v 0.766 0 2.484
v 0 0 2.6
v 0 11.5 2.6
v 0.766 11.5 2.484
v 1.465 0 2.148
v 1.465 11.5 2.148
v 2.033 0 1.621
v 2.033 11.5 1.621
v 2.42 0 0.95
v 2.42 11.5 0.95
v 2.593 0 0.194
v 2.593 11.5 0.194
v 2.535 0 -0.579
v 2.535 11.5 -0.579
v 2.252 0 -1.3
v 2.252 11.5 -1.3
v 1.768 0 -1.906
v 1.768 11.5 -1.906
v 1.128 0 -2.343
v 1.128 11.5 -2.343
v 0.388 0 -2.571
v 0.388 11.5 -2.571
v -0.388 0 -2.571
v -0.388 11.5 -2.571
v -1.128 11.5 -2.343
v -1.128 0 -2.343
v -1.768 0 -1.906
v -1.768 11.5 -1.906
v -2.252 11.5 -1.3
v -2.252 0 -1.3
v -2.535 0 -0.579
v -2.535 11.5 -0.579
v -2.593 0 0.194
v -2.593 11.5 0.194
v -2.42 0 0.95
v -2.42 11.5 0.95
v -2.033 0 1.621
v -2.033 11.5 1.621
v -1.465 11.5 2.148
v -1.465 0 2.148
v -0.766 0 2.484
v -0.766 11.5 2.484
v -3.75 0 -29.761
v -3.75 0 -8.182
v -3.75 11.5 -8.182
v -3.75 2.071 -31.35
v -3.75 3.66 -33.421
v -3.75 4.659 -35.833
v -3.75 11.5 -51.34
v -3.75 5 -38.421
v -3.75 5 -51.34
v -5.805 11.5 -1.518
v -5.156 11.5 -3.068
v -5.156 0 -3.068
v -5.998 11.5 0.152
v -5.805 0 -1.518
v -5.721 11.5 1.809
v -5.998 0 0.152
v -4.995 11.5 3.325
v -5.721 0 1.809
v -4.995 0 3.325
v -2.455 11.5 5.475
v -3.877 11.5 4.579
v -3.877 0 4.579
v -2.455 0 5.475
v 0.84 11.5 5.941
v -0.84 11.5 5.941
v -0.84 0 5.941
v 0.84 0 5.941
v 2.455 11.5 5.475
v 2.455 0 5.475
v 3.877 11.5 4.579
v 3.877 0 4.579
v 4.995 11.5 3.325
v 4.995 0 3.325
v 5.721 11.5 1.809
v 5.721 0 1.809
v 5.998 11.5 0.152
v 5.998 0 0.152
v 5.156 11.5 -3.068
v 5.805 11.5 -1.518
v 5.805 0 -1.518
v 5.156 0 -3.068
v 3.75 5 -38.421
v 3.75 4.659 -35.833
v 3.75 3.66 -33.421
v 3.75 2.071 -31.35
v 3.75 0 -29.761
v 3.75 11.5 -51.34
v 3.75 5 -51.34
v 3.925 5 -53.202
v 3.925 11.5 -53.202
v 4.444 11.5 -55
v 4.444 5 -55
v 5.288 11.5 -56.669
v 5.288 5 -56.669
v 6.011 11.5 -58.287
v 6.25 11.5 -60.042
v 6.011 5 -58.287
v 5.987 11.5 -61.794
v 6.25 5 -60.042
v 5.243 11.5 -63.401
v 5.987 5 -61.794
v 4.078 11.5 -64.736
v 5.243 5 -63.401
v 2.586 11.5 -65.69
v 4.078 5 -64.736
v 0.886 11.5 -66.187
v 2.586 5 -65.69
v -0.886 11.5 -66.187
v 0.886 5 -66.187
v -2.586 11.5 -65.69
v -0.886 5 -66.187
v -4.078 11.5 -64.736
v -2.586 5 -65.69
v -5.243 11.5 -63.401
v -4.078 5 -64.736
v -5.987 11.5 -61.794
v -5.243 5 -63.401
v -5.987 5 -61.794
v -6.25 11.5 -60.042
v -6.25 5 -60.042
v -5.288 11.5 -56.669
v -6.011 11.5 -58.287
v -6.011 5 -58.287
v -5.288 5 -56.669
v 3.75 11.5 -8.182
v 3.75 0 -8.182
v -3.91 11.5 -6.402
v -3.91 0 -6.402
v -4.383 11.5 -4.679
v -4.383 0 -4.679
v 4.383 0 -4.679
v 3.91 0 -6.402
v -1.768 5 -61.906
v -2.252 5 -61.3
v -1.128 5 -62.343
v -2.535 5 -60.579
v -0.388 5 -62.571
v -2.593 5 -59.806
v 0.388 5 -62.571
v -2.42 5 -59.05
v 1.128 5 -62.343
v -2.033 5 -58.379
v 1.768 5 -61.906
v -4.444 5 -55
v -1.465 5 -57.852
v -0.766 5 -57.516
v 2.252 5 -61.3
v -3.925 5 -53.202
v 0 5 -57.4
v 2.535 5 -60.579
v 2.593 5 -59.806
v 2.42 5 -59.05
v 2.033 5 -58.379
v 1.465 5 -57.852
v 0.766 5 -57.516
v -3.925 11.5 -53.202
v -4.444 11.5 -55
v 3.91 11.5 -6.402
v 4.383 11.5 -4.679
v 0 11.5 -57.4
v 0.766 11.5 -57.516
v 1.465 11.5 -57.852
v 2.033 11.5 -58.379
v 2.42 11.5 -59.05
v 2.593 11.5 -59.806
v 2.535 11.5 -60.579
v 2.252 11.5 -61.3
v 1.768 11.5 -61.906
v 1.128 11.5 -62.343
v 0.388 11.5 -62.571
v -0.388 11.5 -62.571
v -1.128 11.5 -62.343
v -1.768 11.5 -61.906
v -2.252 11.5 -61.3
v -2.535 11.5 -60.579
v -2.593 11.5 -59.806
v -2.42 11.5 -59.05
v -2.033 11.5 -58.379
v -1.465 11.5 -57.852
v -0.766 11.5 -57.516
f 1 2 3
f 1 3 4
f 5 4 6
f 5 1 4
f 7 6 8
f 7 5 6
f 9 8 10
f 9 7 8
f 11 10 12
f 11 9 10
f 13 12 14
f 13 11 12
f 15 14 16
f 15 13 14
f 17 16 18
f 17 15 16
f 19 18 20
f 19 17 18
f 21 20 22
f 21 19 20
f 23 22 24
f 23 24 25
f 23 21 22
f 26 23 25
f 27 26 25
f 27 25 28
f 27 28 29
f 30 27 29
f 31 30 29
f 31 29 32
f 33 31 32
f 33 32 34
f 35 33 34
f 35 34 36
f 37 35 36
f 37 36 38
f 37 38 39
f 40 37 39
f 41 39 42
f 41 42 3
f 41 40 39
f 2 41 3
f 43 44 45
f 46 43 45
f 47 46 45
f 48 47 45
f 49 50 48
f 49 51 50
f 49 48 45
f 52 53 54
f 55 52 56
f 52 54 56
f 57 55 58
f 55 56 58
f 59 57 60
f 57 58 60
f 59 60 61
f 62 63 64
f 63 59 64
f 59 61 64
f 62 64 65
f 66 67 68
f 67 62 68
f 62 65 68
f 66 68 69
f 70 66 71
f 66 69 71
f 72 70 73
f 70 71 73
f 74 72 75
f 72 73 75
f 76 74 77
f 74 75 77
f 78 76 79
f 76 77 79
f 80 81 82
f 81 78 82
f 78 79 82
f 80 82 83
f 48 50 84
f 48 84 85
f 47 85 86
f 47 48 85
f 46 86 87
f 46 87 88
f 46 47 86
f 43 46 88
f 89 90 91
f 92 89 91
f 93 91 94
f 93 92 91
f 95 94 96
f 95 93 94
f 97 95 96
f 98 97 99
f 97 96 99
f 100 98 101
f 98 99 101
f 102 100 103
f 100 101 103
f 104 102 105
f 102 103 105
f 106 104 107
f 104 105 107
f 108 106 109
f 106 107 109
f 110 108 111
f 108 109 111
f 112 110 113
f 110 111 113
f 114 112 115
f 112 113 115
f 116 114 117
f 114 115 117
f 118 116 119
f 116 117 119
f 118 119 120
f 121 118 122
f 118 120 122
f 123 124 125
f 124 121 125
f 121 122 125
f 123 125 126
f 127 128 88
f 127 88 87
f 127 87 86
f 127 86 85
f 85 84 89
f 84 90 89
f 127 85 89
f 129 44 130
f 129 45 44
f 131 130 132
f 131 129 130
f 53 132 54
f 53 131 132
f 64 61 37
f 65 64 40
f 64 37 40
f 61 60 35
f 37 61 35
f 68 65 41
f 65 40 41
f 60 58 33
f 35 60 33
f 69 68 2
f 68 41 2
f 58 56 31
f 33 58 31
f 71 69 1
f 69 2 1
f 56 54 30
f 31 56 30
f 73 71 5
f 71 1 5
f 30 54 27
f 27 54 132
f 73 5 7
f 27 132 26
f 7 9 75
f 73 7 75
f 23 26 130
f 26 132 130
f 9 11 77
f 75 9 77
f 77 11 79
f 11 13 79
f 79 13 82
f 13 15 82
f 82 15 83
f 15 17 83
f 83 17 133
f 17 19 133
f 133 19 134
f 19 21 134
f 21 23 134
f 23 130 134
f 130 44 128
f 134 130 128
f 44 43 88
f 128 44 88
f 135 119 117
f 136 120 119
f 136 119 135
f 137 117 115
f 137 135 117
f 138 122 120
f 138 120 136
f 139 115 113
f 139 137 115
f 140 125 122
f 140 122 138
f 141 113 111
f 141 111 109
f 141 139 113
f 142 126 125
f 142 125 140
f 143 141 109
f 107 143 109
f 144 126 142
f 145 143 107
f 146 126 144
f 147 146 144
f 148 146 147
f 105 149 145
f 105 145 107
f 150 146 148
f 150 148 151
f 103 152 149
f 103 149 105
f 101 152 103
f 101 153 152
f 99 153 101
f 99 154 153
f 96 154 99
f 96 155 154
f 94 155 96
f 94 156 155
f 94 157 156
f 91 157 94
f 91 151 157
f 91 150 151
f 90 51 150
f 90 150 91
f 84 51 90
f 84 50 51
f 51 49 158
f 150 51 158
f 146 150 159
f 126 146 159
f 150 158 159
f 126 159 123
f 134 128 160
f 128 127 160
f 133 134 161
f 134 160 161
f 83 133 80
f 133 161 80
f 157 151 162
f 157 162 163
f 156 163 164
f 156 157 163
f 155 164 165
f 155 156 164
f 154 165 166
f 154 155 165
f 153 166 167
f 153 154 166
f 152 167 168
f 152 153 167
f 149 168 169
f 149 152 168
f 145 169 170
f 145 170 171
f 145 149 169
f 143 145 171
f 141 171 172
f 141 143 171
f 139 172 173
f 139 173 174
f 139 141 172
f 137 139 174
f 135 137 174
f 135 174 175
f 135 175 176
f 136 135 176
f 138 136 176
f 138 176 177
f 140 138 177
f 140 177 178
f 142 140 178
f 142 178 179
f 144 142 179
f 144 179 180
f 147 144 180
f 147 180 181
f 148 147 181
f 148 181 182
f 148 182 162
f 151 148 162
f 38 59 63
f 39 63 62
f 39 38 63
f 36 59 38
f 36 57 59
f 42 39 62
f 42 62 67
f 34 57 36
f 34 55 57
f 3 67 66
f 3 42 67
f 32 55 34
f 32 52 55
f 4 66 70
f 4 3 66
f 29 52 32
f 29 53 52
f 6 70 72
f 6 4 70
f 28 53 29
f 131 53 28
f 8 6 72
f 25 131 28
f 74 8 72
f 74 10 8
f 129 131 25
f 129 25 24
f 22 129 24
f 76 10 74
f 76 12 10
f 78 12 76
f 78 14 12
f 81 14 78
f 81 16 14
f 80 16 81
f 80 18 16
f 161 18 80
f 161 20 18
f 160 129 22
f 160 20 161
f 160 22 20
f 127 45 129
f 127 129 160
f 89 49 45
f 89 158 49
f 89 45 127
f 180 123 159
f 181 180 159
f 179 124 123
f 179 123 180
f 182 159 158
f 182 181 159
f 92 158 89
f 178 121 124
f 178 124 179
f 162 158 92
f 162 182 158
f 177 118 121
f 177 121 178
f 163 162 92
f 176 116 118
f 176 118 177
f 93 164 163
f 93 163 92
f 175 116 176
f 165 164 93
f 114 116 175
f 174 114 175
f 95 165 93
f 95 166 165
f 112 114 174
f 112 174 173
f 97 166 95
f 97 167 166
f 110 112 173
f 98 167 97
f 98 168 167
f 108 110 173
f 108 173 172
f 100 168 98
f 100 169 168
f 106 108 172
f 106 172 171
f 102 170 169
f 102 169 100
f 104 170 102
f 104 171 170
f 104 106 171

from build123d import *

# Parameters (mm, degrees)
SKETCH1_R           = 6.25
SKETCH1_R_2         = 2.6
SKETCH1_R_3         = 6
SKETCH1_W           = 7.5
SKETCH1_H           = 50.316251501
BOSS_EXTRUDE1_DEPTH = 11.5
FILLET1_R           = 10
SKETCH2_W           = 12.5
SKETCH2_H           = 36.489359976
CUT_EXTRUDE1_DEPTH  = 5
FILLET2_R           = 10


with BuildPart() as part:
    # Sketch1 → Boss-Extrude1 (new body)
    # profile 1 of 3: a face of its own
    with BuildSketch(Plane(origin=(0, 0, 0), x_dir=(1, 0, 0), z_dir=(0, 1, 0))):
        with Locations((0, 60)):
            Circle(SKETCH1_R)
        with Locations(Location((0, 60, 0), (0, 0, 270))):
            Circle(SKETCH1_R_2, mode=Mode.SUBTRACT)
    # profile 2 of 3: a face of its own
    with BuildSketch(Plane(origin=(0, 0, 0), x_dir=(1, 0, 0), z_dir=(0, 1, 0))):
        Circle(SKETCH1_R_3)
        with Locations(Location((0, 0, 0), (0, 0, 270))):
            Circle(SKETCH1_R_2, mode=Mode.SUBTRACT)
    # profile 3 of 3: a face of its own
    with BuildSketch(Plane(origin=(0, 0, 0), x_dir=(1, 0, 0), z_dir=(0, 1, 0))):
        with Locations((0, 29.84187425)):
            Rectangle(SKETCH1_W, SKETCH1_H)
    extrude(amount=BOSS_EXTRUDE1_DEPTH)

    # Fillet1
    fillet1_edges = [part.edges().sort_by_distance(p)[0] for p in [
        (-3.75, 5.75, -55),
        (3.75, 5.75, -55),
        (3.75, 5.75, -4.683748499),
        (-3.75, 5.75, -4.683748499),
    ]]
    fillet(fillet1_edges, radius=FILLET1_R)

    # Sketch2 → Cut-Extrude1 (cut)
    with BuildSketch(Plane.XZ):
        with Locations((0, -48.005320012)):
            Rectangle(SKETCH2_W, SKETCH2_H)
    extrude(amount=-CUT_EXTRUDE1_DEPTH, mode=Mode.SUBTRACT)

    # Fillet2
    # the kernel refuses this fillet: 10 mm, written as the material it adds along each edge
    with BuildSketch(Plane(origin=(-3.75, 5, -29.760640024), x_dir=(0, -1, 0), z_dir=(1, 0, 0))) as fillet2_piece_1:
        with BuildLine():
            CenterArc((10, 8.660254038), FILLET2_R, 180, 60)
            Line((0, 8.660254038), (-0.2, 8.660254038))
            Line((-0.2, 8.660254038), (-0.2, 0))
            Line((-0.2, 0), (0, -0.2))
            ThreePointArc((0, -0.2), (2.5, -0.2), (4.9, -0.173205081))
            Line((4.9, -0.173205081), (5, 0))
        make_face()
    extrude(amount=7.5)


solid = part.part
